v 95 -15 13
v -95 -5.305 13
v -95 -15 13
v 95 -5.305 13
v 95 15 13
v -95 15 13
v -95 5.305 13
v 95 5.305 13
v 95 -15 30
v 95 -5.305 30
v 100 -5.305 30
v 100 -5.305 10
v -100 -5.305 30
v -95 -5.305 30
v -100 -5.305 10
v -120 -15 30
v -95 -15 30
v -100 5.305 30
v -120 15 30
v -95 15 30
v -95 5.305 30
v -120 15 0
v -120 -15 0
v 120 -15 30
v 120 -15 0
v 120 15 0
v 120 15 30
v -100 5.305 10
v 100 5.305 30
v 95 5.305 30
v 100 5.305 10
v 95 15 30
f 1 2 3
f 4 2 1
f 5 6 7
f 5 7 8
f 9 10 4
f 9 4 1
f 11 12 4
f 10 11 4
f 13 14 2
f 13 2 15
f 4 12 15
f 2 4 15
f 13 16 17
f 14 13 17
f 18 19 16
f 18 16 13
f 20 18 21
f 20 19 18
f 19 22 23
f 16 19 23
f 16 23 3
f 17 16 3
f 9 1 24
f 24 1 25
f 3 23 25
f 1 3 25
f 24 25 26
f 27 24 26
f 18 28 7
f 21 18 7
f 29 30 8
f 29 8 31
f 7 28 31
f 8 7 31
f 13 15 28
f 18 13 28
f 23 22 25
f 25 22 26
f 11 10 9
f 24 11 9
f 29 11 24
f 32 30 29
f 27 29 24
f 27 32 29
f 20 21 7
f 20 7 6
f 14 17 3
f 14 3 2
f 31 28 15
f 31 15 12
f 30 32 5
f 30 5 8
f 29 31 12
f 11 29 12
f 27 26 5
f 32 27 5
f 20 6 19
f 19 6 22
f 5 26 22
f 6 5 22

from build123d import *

# Parameters (mm, degrees)
F0_W     = 190
F0_H     = 9.6947368307
F0_H_2   = 10.6105263385
F0_W_2   = 5
F1_DEPTH = 10
F2_DEPTH = 13
F3_DEPTH = 30


with BuildPart() as f1:
    # F0 (on Top) → F1 (new body)
    with BuildSketch(Plane.XY):
        Polygon((-95, 15), (-120, 15), (-120, -15), (-95, -15), (-95, -5.3052631693), (-100, -5.3052631693), (-100, 5.3052631693), (-95, 5.3052631693), align=None)
        with Locations((0, 10.1526315846)):
            Rectangle(F0_W, F0_H)
        Polygon((120, 15), (95, 15), (95, 5.3052631693), (100, 5.3052631693), (100, -5.3052631693), (95, -5.3052631693), (95, -15), (120, -15), align=None)
        with Locations((0, -10.1526315846)):
            Rectangle(F0_W, F0_H)
        Rectangle(F0_W, F0_H_2)
        with Locations((-97.5, 0)):
            Rectangle(F0_W_2, F0_H_2)
        with Locations((97.5, 0)):
            Rectangle(F0_W_2, F0_H_2)
    extrude(amount=F1_DEPTH)

    # F0 (on Top) → F2 (join)
    with BuildSketch(Plane.XY):
        Polygon((-95, 15), (-120, 15), (-120, -15), (-95, -15), (-95, -5.3052631693), (-100, -5.3052631693), (-100, 5.3052631693), (-95, 5.3052631693), align=None)
        with Locations((0, 10.1526315846)):
            Rectangle(F0_W, F0_H)
        Polygon((120, 15), (95, 15), (95, 5.3052631693), (100, 5.3052631693), (100, -5.3052631693), (95, -5.3052631693), (95, -15), (120, -15), align=None)
        with Locations((0, -10.1526315846)):
            Rectangle(F0_W, F0_H)
    extrude(amount=F2_DEPTH)

    # F0 (on Top) → F3 (join)
    with BuildSketch(Plane.XY):
        Polygon((-95, 15), (-120, 15), (-120, -15), (-95, -15), (-95, -5.3052631693), (-100, -5.3052631693), (-100, 5.3052631693), (-95, 5.3052631693), align=None)
        Polygon((120, 15), (95, 15), (95, 5.3052631693), (100, 5.3052631693), (100, -5.3052631693), (95, -5.3052631693), (95, -15), (120, -15), align=None)
    extrude(amount=F3_DEPTH)


solid = f1.part
